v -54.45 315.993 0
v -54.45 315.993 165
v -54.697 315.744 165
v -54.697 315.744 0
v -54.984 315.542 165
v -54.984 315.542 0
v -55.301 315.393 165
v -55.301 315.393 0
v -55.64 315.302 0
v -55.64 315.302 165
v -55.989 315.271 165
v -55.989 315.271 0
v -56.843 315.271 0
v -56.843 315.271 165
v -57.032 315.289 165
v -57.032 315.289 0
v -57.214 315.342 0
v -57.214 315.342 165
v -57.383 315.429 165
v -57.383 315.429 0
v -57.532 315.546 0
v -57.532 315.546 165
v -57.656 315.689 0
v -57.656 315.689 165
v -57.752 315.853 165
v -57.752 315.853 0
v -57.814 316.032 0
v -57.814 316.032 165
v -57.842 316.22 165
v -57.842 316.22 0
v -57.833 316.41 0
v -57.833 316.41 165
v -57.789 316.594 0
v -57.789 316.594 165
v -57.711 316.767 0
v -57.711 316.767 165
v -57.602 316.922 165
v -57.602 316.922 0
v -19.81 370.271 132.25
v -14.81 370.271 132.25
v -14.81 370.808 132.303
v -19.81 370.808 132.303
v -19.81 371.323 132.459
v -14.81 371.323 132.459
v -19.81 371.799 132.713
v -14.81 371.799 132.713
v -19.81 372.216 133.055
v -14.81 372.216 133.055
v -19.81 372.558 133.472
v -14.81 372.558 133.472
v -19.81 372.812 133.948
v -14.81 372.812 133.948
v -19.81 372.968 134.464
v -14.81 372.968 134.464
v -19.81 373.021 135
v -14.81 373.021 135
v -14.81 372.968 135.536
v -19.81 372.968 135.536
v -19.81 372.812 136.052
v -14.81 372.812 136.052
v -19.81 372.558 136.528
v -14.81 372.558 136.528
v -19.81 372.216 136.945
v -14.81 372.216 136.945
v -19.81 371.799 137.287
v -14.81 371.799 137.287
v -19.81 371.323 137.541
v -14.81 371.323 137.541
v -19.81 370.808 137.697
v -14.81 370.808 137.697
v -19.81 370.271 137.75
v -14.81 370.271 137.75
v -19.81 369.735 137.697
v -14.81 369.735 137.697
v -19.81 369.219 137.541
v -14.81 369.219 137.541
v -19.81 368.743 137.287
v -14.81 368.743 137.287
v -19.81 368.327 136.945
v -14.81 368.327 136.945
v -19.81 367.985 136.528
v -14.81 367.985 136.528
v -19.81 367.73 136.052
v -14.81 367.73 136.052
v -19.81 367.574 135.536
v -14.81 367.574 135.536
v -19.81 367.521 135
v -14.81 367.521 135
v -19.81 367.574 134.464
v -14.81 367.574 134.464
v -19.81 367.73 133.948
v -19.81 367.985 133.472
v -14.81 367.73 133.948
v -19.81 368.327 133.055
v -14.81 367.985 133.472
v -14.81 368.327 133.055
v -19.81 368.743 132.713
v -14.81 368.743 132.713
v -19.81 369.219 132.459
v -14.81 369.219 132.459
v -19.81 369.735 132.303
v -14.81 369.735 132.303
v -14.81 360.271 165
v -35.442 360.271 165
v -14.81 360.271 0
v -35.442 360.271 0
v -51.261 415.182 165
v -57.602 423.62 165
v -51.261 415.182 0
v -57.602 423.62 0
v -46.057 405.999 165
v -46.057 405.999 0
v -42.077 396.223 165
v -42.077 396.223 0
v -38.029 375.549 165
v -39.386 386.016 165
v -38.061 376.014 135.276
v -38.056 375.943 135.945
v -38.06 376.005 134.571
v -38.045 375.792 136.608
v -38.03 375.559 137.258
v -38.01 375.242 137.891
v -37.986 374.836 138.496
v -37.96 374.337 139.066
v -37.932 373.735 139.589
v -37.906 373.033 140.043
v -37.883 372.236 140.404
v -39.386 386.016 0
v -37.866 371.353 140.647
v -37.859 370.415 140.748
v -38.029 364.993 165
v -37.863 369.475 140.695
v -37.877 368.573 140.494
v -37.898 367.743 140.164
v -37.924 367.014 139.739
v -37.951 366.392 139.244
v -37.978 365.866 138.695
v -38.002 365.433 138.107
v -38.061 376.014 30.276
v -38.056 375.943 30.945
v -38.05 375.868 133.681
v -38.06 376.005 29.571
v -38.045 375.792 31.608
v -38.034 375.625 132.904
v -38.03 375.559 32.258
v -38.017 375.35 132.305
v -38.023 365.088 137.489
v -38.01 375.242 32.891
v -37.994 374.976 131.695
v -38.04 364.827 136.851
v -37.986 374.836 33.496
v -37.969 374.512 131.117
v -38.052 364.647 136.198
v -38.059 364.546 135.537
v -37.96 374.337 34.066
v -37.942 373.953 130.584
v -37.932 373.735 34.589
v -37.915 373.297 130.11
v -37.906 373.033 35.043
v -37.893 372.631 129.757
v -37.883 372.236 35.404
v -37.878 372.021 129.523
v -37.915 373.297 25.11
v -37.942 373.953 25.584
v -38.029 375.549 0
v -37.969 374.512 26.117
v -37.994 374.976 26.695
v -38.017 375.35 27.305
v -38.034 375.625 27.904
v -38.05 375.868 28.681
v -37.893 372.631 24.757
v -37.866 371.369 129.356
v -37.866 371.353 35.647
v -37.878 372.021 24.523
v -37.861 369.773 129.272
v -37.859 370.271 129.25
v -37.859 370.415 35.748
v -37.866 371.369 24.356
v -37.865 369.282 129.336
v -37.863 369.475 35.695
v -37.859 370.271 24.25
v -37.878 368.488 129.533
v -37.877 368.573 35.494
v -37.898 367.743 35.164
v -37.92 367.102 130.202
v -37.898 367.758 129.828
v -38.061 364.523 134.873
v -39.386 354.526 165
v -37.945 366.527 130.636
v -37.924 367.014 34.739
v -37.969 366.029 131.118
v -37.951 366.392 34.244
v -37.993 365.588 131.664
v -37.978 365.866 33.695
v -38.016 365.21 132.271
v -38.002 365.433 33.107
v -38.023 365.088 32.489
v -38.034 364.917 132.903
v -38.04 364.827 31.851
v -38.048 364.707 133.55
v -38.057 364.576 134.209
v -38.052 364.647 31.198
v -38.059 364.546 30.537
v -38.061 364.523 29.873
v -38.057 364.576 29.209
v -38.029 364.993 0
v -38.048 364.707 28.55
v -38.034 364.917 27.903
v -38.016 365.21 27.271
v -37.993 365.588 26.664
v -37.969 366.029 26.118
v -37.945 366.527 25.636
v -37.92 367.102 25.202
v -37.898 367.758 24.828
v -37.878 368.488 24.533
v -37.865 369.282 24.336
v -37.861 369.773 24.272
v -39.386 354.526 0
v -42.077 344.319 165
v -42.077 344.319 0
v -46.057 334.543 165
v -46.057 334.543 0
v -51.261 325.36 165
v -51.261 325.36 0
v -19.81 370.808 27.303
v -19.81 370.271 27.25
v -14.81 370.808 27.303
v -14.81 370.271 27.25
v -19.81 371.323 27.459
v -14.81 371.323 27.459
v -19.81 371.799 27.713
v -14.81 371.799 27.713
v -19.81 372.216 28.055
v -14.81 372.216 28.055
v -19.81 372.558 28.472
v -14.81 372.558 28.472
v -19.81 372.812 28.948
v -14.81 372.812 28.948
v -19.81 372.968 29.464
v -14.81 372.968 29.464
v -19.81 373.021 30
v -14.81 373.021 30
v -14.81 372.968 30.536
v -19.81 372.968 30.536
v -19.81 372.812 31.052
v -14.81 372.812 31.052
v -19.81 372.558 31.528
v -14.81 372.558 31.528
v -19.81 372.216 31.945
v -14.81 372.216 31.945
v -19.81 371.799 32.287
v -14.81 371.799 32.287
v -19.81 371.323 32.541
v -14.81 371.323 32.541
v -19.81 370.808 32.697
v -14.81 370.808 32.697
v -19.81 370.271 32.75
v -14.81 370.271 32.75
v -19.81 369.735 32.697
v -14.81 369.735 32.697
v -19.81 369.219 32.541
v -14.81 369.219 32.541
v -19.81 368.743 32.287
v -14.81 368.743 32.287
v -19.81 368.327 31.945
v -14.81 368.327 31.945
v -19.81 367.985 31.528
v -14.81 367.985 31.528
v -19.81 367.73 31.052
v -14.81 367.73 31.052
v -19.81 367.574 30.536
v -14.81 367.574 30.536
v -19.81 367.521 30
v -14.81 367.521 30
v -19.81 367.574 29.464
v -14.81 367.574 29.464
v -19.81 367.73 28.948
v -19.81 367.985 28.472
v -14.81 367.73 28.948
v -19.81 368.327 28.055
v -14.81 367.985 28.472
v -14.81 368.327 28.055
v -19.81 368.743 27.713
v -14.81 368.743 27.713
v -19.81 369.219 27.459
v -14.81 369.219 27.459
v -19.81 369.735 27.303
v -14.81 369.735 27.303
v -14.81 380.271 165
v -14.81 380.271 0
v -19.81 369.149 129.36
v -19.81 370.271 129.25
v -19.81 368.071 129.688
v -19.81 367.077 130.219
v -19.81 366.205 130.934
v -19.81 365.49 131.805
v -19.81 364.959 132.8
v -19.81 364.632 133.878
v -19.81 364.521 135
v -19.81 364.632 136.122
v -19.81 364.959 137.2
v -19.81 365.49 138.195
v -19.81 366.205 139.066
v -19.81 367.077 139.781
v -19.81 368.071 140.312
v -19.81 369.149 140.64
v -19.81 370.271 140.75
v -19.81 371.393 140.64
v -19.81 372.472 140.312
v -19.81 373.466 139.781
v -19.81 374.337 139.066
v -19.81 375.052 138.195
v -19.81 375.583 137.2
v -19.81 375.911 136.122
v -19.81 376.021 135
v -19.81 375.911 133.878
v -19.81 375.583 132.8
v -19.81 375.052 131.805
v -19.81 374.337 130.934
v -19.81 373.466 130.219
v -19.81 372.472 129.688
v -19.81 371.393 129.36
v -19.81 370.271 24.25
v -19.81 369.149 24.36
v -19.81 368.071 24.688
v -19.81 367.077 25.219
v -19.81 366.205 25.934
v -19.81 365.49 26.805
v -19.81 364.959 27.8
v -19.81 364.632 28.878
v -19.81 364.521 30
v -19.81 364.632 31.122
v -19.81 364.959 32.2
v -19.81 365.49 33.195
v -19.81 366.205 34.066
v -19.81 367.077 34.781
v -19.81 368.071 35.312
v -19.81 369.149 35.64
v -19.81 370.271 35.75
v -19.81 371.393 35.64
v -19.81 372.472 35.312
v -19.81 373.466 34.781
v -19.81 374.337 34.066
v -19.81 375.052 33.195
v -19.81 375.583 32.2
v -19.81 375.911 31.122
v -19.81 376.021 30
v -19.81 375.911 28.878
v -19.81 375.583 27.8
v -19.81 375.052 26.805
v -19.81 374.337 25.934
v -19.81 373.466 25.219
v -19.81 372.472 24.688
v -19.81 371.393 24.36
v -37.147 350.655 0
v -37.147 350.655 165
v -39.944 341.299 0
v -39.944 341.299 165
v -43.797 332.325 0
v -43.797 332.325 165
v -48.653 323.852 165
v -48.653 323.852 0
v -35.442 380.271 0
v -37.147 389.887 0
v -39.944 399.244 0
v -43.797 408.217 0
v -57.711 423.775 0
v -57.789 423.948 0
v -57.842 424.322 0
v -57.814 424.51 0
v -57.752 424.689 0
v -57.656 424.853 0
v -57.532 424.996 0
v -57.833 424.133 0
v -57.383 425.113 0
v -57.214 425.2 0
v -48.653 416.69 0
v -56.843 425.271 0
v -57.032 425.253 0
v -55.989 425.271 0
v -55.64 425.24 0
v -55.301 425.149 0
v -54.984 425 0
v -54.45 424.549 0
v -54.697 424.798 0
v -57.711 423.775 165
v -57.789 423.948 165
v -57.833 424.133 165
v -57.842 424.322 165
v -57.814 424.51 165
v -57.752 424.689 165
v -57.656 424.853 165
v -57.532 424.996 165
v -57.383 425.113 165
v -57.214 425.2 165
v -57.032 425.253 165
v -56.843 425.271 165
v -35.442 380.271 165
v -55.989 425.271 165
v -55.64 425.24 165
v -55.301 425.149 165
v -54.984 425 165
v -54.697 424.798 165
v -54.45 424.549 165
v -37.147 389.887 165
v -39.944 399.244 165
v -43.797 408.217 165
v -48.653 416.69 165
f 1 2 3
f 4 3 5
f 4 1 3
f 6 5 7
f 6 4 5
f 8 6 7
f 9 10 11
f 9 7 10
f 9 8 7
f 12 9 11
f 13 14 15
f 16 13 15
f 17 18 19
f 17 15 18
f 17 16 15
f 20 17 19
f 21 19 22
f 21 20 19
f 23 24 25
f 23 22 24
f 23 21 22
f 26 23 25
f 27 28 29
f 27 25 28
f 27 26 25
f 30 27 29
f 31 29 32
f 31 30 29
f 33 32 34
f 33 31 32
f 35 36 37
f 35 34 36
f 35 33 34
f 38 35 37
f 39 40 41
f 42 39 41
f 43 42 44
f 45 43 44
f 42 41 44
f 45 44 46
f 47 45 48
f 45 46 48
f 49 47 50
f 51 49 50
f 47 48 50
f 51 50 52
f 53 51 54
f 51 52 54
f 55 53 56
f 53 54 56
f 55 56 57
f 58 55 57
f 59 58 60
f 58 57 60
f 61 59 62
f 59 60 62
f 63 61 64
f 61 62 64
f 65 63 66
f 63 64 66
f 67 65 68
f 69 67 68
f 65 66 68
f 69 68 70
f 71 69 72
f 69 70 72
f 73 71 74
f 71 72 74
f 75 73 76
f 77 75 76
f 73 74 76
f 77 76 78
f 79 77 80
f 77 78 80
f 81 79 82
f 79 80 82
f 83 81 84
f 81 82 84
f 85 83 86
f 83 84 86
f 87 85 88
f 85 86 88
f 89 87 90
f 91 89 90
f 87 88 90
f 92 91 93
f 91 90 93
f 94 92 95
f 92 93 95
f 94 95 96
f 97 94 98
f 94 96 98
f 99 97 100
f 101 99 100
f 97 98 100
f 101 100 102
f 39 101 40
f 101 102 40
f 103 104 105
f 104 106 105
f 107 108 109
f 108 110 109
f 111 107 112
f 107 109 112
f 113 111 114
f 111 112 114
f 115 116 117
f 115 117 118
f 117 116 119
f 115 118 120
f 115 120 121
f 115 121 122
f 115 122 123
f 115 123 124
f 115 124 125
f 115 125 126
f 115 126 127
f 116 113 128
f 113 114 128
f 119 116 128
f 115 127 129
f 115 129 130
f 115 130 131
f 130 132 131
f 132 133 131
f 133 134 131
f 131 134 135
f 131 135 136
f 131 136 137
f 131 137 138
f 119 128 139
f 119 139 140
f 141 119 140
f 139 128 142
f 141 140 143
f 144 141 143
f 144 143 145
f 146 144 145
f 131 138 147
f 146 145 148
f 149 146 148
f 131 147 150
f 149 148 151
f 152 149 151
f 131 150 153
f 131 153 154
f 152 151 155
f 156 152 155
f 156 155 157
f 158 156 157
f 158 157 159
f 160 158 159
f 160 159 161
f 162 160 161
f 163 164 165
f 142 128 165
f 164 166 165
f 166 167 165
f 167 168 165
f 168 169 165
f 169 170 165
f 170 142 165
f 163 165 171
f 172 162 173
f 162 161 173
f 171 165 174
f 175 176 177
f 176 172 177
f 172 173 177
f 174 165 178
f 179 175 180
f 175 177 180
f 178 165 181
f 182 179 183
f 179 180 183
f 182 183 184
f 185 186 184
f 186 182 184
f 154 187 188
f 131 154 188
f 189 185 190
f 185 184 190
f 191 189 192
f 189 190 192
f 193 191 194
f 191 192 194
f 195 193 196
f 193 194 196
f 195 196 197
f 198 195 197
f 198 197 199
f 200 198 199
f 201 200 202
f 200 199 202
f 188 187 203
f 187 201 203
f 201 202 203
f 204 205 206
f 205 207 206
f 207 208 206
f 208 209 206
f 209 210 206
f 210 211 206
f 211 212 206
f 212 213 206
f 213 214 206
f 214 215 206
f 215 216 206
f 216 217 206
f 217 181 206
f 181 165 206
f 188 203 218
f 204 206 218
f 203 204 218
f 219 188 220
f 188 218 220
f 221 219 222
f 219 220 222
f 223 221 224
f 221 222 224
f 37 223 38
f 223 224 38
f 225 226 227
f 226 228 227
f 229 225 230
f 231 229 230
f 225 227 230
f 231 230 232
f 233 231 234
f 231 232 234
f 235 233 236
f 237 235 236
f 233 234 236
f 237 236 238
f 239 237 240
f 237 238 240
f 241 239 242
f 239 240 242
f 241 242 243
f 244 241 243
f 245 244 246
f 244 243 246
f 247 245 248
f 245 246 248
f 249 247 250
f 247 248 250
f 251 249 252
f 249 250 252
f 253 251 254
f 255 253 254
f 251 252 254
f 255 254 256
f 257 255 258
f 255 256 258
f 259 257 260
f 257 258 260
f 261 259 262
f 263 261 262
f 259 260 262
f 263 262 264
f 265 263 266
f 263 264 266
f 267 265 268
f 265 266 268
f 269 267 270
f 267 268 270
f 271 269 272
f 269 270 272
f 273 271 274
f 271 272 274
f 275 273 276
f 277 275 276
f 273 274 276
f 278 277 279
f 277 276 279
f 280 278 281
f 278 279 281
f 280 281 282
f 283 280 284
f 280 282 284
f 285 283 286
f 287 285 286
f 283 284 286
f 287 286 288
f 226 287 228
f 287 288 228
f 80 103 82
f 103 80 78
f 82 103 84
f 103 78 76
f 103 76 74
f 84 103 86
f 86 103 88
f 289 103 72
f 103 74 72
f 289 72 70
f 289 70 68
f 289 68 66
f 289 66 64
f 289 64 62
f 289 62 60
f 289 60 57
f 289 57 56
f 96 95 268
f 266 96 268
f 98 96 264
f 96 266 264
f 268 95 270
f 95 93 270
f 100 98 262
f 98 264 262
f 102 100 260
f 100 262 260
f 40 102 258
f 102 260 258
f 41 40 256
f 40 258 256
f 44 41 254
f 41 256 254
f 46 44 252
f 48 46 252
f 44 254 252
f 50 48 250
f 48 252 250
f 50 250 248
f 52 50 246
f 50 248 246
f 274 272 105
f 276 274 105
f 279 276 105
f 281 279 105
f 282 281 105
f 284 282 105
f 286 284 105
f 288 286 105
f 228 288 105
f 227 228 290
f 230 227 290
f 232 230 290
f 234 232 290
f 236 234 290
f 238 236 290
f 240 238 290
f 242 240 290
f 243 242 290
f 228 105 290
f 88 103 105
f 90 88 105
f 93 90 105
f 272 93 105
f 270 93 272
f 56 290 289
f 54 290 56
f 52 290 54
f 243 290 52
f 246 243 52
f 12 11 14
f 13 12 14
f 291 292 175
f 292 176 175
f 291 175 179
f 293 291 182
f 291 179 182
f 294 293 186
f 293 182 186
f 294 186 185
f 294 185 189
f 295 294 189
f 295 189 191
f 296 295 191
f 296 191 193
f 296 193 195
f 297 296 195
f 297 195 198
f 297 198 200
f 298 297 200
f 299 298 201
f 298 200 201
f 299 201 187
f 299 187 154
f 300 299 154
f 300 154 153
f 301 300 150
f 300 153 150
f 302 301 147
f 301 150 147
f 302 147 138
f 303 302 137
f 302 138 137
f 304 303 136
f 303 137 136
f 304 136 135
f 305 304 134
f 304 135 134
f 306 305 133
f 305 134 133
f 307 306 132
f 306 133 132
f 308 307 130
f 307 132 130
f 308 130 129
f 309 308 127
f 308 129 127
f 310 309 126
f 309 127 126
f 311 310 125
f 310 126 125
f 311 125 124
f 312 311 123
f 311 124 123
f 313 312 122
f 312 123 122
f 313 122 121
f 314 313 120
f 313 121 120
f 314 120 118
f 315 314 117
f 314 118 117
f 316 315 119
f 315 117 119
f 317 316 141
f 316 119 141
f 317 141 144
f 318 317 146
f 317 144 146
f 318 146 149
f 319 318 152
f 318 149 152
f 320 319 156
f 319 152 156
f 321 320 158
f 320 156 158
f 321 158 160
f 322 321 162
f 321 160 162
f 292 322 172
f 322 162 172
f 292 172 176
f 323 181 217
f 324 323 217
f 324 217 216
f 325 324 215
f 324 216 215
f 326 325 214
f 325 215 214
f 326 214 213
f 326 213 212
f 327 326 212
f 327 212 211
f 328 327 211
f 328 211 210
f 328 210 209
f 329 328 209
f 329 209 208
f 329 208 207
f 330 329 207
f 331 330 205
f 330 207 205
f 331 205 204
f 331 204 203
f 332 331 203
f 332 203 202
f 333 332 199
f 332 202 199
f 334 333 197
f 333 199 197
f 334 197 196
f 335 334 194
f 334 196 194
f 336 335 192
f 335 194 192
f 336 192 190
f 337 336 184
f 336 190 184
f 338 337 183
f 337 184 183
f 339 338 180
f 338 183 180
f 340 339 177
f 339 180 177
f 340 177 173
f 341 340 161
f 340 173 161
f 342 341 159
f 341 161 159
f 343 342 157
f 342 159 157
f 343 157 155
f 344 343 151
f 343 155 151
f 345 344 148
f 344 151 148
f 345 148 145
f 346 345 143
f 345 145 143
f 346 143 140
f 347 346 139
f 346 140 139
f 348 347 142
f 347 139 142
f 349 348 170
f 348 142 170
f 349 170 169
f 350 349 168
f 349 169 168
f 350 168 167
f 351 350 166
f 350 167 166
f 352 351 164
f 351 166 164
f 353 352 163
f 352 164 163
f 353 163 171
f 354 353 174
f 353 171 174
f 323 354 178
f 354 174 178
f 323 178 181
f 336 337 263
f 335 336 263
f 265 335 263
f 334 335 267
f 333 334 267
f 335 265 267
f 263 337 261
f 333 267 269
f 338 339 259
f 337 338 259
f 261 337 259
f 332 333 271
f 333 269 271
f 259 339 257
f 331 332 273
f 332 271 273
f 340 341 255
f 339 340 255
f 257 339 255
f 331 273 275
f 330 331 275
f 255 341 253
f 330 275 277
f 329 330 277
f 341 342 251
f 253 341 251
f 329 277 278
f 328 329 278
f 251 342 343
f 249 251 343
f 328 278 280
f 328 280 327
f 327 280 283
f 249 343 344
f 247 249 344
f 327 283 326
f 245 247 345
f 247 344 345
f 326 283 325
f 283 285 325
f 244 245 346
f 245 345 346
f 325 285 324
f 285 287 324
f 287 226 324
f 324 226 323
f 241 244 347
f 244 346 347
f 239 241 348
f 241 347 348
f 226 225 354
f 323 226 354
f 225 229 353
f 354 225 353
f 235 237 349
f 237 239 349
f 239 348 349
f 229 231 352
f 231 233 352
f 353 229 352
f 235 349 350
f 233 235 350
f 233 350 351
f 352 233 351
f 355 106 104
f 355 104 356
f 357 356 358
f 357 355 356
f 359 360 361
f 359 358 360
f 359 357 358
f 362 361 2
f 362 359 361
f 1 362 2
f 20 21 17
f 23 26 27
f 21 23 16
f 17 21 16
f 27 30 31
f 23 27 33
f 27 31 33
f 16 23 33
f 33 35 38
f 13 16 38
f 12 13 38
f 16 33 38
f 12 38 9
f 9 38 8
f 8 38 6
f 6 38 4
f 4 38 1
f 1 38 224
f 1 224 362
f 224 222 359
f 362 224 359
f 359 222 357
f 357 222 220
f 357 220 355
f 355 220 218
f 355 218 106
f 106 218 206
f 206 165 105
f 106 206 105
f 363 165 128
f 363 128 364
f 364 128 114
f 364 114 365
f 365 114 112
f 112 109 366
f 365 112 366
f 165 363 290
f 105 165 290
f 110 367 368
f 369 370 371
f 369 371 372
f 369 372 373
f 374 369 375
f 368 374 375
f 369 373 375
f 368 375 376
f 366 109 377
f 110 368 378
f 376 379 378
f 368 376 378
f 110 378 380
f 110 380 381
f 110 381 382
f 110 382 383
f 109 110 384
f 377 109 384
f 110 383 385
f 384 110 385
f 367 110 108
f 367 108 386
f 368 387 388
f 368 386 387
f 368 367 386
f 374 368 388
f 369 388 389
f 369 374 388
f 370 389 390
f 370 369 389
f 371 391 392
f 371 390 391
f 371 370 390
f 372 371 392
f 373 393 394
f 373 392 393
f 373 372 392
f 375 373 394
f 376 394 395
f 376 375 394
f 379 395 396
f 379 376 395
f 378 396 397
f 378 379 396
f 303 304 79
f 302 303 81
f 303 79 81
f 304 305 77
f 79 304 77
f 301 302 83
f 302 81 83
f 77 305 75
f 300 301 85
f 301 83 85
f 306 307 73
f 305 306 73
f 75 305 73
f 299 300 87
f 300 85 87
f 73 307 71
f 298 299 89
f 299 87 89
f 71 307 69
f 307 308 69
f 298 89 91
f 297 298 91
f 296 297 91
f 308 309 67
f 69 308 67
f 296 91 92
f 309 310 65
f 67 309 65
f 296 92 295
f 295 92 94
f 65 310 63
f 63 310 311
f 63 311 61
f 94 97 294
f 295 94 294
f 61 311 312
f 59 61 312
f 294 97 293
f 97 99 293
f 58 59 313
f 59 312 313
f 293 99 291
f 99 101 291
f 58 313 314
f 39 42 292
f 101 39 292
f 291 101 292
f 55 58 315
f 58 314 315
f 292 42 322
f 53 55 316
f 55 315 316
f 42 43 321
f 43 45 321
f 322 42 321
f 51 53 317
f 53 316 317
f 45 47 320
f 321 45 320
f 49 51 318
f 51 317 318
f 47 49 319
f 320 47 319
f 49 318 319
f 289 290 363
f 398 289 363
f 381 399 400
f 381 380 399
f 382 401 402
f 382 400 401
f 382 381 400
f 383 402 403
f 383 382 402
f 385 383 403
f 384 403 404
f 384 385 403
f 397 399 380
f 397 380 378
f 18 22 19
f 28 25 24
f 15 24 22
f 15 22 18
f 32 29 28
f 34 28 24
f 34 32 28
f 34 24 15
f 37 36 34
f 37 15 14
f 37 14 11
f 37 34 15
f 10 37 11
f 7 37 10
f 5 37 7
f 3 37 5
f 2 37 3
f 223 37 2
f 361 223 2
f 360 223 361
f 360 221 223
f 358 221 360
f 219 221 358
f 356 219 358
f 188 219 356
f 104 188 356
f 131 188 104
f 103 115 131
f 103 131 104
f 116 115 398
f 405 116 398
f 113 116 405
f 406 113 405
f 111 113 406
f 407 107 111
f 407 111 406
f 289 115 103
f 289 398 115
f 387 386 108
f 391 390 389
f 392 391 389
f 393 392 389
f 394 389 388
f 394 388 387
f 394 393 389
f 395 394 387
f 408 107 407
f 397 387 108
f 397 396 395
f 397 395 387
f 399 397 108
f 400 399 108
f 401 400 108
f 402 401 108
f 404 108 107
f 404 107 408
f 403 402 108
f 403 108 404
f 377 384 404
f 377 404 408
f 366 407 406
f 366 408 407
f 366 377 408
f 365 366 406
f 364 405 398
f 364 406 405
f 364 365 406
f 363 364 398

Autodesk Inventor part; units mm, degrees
ref_plane "YZ Plane" through (0, 0, 0) normal (1, 0, 0) x (0, 1, 0)
ref_plane "XZ Plane" through (0, 0, 0) normal (0, 1, 0) x (-1, 0, 0)
ref_plane "XY Plane" through (0, 0, 0) normal (0, 0, 1) x (1, 0, 0)
ref_plane "Work Plane1" through (-14.5039, 0, 0) normal (0, 0, 1) x (1, 0, 0)
sketch "Sketch1" plane through (-14.5039, 0, 0) normal (0, 0, 1) x (1, 0, 0)
  line L0 (-0.3057, 380.2711) -> (-25.3057, 380.2711)
  line L1 (-25.3057, 380.2711) -> (-25.3057, 360.2711)
  line L2 (-25.3057, 360.2711) -> (-0.3057, 360.2711)
  line L3 (-0.3057, 360.2711) -> (-0.3057, 380.2711)
  arc A0 (-39.9465, 315.9933) -> (-39.9465, 424.5488) centre (-105.3057, 370.2711) ccw
  line L4 (-40.5531, 425.2711) -> (-40.5531, 315.2711) construction
  line L5 (-40.5531, 425.2711) -> (69.4469, 425.2711) construction
  line L6 (-41.4851, 315.2711) -> (-42.3392, 315.2711)
  line L7 (-41.4851, 425.2711) -> (-42.3392, 425.2711)
  arc A1 (-43.0983, 316.922) -> (-43.0983, 423.6201) centre (-105.3057, 370.2711) ccw
  arc A2 (-41.4851, 315.2711) -> (-39.9465, 315.9933) centre (-41.4851, 317.2711) ccw
  arc A3 (-39.9465, 424.5488) -> (-41.4851, 425.2711) centre (-41.4851, 423.2711) ccw
  arc A4 (-42.3392, 425.2711) -> (-43.0983, 423.6201) centre (-42.3392, 424.2711) ccw
  arc A5 (-43.0983, 316.922) -> (-42.3392, 315.2711) centre (-42.3392, 316.2711) ccw
  point P0 (14.5039, 0)
  point P1 (-44.5531, 315.2711)
  point P2 (-44.5531, 425.2711)
  point P3 (-20.938, 380.2711)
  point P4 (-20.938, 360.2711)
  dimension "d0" = 25
  dimension "d1" = 20
  dimension "d2" = 110
  dimension "d3" = 90
  dimension "d4" = 45
  dimension "d5" = 105
  dimension "d6" = 4
  dimension "d22" = 2
  dimension "d23" = 2
  dimension "d24" = 1
extrude "Extrusion1" add sketch "Sketch1" along normal blind 165 contours L3 L2 A0 L0 | A0 L2 A1 L0 | L0 A1 A4 L7 A3 A0 | A0 A2 L6 A5 A1 L2
sketch "Sketch2" plane through (-14.8095, 360.2711, 0) normal (1, 0, 0) x (0, 0, -1)
  circle A0 centre (-30, 10) radius 2.75
  circle A1 centre (-135, 10) radius 2.75
  line L0 (-165, 0) -> (-165, 20) projected
  line L1 (0, 0) -> (0, -44.2778) projected
  line L2 (-30, 10) -> (-135, 10)
  line L3 (0, -45) -> (-165, -45) projected
  point P0 (0, -360.2711)
  dimension "d10" = 5.5
  dimension "d11" = 5.5
  dimension "d12" = 30
  dimension "d13" = 30
  dimension "d17" = 55
extrude "Extrusion2" cut sketch "Sketch2" against normal through all
ref_plane "Work Plane2" through (-39.8095, 360.2711, 0) normal (1, 0, 0) x (0, 0, -1)
sketch "Sketch4" plane through (-39.8095, 360.2711, 0) normal (1, 0, 0) x (0, 0, -1)
  circle A0 centre (-30, 10) radius 2.75 projected
  circle A1 centre (-30, 10) radius 5.75
  circle A2 centre (-135, 10) radius 2.75 projected
  circle A3 centre (-135, 10) radius 5.75
  point P0 (0, -360.2711)
  dimension "d18" = 11.5
  dimension "d19" = 11.5
extrude "Extrusion3" cut sketch "Sketch4" along normal blind 20 contours A0 | A1 | A3
equation "\"d4\" = -0.5 * d1 + 0.5 * d2"
properties part number "LegSupport"
